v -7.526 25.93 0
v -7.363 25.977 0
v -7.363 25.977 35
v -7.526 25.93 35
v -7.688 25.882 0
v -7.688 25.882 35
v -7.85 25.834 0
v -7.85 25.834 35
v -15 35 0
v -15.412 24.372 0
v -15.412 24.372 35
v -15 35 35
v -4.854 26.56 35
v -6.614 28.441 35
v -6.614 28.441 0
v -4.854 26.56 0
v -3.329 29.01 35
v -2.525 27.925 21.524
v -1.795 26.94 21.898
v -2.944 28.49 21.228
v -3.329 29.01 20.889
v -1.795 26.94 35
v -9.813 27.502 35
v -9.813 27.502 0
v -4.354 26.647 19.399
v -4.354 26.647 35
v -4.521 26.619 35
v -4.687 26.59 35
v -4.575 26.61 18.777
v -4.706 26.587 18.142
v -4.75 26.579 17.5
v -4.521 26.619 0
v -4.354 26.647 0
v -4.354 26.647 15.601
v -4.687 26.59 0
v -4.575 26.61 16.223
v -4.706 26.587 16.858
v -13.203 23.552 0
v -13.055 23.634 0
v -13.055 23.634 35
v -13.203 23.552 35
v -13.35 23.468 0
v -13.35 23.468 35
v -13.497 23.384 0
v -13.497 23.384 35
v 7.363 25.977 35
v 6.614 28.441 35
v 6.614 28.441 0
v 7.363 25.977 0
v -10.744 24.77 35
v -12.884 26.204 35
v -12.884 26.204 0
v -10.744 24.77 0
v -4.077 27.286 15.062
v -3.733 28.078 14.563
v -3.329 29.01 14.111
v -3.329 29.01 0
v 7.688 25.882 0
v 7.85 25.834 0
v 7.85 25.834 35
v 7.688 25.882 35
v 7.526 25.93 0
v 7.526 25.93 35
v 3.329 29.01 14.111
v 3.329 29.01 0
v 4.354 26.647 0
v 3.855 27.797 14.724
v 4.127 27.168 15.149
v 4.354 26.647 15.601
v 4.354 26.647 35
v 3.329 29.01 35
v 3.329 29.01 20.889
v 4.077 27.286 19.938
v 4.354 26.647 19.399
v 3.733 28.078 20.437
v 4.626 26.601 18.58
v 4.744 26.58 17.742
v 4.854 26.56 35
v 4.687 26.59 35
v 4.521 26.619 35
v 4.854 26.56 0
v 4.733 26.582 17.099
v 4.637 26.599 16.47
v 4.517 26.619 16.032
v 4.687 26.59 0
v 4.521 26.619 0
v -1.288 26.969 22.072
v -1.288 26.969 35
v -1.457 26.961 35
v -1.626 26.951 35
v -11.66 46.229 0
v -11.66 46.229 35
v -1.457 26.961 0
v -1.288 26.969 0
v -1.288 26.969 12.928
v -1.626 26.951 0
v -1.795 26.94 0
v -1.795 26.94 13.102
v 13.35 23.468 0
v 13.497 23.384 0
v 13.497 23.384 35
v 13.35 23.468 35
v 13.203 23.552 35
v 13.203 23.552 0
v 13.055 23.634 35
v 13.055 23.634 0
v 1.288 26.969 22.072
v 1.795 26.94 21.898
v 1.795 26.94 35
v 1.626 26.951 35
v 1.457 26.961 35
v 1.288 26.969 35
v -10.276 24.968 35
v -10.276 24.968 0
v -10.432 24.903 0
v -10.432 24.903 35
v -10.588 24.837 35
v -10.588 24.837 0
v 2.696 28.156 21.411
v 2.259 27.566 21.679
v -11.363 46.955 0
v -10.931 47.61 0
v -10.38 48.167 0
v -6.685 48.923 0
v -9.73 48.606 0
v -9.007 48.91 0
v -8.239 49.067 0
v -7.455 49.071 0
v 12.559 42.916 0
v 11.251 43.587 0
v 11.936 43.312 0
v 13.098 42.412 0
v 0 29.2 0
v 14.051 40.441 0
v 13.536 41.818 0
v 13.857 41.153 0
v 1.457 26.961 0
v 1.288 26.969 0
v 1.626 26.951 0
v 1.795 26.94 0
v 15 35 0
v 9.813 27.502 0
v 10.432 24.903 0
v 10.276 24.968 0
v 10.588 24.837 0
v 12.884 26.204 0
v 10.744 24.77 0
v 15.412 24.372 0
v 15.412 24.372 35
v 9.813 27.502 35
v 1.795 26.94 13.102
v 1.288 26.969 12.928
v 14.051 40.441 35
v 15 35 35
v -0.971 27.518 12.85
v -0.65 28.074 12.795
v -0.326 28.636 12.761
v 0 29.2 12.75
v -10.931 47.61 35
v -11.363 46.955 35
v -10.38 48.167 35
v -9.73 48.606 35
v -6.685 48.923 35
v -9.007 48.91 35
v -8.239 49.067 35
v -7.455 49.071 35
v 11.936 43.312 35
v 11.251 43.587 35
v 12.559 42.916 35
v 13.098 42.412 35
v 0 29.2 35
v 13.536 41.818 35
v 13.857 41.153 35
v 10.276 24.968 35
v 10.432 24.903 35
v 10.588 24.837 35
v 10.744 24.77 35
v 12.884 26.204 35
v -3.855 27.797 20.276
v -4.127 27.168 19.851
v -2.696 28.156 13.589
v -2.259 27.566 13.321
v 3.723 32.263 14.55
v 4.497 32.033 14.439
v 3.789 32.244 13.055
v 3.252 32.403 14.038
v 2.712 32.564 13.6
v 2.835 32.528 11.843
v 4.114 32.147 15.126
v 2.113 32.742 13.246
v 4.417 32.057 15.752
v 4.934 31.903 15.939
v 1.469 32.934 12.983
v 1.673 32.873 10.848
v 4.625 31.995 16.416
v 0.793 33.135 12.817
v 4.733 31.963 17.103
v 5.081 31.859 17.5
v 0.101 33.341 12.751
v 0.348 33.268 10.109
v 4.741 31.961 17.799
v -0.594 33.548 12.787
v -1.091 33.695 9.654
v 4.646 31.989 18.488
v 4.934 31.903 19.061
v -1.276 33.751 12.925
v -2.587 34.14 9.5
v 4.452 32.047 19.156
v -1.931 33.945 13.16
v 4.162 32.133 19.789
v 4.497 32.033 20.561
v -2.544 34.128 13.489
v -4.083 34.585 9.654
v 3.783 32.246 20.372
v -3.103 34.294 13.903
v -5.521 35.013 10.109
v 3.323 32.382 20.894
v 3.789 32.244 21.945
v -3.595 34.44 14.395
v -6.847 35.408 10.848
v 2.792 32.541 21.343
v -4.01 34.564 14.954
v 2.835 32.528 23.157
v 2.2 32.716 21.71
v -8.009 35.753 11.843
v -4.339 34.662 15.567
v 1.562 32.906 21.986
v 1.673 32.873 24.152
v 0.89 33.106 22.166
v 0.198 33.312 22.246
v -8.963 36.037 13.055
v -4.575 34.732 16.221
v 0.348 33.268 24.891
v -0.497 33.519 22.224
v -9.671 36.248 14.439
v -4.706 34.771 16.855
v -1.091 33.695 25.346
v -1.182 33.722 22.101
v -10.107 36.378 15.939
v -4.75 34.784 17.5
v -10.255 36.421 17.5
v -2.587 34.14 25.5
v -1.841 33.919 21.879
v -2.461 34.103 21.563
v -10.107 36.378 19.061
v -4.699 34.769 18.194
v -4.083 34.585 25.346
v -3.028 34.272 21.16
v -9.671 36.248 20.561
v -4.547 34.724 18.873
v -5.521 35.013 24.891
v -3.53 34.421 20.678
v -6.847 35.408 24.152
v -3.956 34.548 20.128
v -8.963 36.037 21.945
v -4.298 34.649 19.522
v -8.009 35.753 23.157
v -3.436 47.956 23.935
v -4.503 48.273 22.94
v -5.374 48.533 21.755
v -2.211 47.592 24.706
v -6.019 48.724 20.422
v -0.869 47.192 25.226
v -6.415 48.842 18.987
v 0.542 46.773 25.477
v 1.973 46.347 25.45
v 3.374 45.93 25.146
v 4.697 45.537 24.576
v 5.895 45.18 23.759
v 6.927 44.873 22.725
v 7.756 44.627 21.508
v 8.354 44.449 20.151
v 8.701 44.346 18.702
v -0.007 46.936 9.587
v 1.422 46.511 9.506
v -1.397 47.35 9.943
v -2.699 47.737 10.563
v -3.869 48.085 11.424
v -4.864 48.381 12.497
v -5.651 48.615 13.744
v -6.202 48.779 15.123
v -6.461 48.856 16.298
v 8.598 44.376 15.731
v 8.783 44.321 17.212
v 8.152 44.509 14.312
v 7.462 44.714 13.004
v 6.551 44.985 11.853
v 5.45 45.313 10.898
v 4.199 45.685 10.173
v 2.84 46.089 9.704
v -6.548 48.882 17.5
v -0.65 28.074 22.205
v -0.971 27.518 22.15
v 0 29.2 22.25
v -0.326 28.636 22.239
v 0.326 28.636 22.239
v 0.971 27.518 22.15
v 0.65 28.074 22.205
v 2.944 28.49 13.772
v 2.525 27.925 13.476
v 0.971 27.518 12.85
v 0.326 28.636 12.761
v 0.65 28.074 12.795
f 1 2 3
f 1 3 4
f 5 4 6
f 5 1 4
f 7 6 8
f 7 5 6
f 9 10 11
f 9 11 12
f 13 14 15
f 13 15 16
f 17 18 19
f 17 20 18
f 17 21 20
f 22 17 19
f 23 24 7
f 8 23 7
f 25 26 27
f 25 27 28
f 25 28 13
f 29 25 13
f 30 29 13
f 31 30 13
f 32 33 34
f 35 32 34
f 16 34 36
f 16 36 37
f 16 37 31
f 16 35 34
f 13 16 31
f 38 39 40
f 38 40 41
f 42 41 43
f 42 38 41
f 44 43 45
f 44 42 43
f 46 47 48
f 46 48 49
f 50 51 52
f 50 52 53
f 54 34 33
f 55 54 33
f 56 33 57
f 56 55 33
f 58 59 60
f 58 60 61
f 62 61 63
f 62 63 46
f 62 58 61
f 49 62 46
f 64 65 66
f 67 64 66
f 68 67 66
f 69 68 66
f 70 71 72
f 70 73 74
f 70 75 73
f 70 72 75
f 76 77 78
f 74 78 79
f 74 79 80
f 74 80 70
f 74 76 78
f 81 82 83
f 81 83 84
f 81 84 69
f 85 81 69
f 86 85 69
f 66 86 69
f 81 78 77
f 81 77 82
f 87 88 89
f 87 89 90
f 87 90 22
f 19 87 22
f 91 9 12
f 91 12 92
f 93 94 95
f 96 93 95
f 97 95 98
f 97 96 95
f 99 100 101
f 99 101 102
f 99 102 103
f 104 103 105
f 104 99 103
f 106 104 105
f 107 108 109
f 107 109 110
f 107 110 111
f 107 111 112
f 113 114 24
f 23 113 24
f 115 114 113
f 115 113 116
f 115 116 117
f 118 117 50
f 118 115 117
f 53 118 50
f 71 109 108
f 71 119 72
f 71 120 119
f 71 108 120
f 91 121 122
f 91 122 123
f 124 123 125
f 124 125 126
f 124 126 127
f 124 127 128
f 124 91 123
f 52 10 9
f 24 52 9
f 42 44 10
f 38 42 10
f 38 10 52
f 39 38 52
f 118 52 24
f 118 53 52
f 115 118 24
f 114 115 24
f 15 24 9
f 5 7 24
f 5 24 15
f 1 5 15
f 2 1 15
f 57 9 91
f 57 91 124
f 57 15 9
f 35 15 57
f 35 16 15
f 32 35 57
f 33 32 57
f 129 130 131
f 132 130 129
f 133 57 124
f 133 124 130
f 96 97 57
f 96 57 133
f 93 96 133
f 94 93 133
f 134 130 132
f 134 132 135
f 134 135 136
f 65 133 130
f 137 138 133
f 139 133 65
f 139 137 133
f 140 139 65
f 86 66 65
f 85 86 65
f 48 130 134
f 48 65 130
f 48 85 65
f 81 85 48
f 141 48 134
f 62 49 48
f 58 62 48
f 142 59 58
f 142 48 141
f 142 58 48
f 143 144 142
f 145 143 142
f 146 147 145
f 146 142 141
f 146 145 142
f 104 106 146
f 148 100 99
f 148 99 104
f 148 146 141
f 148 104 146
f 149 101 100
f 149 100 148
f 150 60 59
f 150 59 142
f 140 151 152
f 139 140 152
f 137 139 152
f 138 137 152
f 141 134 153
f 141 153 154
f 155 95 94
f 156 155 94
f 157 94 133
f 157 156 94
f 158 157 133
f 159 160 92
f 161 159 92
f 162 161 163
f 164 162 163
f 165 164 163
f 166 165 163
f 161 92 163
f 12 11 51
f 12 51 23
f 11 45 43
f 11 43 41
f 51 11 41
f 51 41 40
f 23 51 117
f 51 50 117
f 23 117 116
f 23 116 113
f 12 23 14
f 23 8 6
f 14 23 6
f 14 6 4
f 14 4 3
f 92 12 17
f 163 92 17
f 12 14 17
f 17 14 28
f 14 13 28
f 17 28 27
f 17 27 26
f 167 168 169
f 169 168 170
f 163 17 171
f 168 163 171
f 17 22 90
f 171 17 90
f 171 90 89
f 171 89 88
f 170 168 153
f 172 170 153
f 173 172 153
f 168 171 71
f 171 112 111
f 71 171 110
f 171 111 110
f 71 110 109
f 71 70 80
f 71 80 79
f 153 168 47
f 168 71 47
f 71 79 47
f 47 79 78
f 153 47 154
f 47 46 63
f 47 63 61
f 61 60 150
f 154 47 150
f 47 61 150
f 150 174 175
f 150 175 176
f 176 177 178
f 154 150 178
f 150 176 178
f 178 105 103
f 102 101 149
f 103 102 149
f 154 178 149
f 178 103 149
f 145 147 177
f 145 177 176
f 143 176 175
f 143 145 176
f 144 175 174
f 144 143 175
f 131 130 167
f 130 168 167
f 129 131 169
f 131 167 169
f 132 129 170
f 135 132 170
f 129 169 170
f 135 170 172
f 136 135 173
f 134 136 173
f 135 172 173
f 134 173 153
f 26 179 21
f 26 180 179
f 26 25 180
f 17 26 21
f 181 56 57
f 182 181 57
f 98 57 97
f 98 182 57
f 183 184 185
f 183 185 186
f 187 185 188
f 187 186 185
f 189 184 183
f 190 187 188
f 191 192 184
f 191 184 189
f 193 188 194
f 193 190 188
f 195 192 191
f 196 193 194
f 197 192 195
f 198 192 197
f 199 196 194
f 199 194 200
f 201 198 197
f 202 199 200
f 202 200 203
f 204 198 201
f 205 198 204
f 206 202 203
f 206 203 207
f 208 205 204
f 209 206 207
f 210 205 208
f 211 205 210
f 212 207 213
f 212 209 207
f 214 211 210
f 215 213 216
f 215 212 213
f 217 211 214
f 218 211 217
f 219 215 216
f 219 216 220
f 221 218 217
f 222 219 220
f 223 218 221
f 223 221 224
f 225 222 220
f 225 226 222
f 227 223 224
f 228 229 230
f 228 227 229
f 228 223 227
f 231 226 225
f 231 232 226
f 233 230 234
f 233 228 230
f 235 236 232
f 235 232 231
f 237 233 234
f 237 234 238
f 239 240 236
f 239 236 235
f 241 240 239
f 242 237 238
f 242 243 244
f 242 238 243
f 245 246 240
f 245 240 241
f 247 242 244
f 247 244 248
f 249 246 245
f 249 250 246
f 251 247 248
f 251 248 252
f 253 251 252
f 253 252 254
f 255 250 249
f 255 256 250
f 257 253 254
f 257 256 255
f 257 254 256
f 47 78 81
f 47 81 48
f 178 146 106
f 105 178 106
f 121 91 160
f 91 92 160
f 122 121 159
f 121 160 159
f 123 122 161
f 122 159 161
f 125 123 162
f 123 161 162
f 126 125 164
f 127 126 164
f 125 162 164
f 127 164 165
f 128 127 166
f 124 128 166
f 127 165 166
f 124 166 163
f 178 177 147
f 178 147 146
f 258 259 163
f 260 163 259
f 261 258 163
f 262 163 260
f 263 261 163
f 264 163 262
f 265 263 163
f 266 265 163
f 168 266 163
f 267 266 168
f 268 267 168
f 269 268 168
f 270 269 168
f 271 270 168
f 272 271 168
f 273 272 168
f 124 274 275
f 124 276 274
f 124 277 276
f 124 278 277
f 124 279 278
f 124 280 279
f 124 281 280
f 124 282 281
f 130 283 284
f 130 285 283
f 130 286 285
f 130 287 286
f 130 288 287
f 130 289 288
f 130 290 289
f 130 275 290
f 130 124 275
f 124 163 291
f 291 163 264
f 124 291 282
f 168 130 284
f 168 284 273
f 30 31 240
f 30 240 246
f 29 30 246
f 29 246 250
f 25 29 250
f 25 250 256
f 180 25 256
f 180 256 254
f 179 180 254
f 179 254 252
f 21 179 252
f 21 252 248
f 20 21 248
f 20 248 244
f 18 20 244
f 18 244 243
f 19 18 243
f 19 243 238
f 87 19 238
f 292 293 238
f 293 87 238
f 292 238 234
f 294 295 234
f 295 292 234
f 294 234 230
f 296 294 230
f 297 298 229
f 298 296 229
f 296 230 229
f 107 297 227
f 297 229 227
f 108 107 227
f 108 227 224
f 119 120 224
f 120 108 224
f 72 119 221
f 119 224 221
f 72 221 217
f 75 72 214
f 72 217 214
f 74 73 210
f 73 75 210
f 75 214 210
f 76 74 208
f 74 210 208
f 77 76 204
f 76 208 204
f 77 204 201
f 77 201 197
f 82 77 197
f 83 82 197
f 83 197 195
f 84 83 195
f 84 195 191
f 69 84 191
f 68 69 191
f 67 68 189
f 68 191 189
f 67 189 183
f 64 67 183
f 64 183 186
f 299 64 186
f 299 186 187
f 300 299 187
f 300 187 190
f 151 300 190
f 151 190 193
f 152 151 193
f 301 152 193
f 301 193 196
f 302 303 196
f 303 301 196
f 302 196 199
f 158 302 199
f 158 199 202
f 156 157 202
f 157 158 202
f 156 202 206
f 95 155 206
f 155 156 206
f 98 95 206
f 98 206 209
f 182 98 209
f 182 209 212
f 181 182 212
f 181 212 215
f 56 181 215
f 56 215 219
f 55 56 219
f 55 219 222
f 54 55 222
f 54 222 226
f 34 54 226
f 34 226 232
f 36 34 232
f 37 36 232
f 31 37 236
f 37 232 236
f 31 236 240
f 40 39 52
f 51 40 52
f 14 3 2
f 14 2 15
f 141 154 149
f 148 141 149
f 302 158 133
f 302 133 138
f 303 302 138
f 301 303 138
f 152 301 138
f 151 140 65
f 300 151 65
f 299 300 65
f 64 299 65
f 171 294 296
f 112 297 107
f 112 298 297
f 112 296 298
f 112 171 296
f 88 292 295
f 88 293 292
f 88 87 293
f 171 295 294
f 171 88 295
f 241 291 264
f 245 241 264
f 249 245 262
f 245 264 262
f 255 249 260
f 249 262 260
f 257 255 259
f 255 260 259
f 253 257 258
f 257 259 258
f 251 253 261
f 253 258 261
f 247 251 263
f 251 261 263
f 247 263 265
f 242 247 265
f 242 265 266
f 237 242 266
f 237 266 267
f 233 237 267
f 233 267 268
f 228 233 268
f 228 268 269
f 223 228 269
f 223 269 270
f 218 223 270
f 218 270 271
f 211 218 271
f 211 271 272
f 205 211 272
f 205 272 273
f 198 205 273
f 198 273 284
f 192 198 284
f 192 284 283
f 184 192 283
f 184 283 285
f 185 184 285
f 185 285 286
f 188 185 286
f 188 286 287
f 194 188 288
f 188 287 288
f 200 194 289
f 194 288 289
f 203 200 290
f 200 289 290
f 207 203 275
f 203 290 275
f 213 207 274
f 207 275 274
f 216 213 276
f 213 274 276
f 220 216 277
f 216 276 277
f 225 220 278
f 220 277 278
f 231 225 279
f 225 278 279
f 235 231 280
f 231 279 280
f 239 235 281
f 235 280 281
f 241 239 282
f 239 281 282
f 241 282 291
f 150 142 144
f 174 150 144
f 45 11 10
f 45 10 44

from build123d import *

# Parameters (mm, degrees)
PAD_DEPTH          = 35
SKETCH003_R        = 4.75
POCKET_DEPTH       = 12.893309
PAD001_DEPTH       = 35
SKETCH005_R        = 8
POCKET001_DEPTH    = 13
POCKET002_DEPTH    = 143.950619
POLARPATTERN_COUNT = 55
FILLET_R           = 4


with BuildPart() as part:
    # Sketch → Pad (new body)
    with BuildSketch(Plane.XY):
        with BuildLine():
            ThreePointArc((15.5, 22.107691), (0, 27), (-15.5, 22.107691))
            Line((-15.5, 22.107691), (-15, 35))
            Line((-15, 35), (15, 35))
            Line((15, 35), (15.5, 22.107691))
        make_face()
    extrude(amount=PAD_DEPTH)

    # Sketch003 (on Face3 of Pad) → Pocket (cut, through all)
    with BuildSketch(Plane(origin=(0, 35, 0), x_dir=(-1, 0, 0), z_dir=(0, 1, 0))):
        with Locations((0, 17.5)):
            Circle(SKETCH003_R)
    extrude(amount=-POCKET_DEPTH, mode=Mode.SUBTRACT)

    # Sketch004 (on Face3 of Pocket) → Pad001 (join)
    with BuildSketch(Plane(origin=(0, 0, 0), x_dir=(1, 0, 0), z_dir=(0, 0, -1))):
        Polygon((-15, -35), (-10.519122, -50.063099), (13.624797, -42.880915), (15, -35), align=None)
    extrude(amount=-PAD001_DEPTH)

    # Sketch005 (on Face12 of Pad001) → Pocket001 (cut)
    with BuildSketch(Plane(origin=(12.826585, 43.118362, 0), x_dir=(-0.95849, 0.285126, 0), z_dir=(0.285126, 0.95849, 0))):
        with Locations((12.213826, 17.5)):
            Circle(SKETCH005_R)
    extrude(amount=-POCKET001_DEPTH, mode=Mode.SUBTRACT)

    # Sketch001 (on Face4 of Pocket001) → Pocket002 (cut, through all)
    with BuildSketch(Plane.XY.offset(35)):
        Polygon((-7.025, 17.032343), (0, 29.2), (7.025, 17.032343), align=None)
    pocket002 = extrude(amount=-POCKET002_DEPTH, mode=Mode.SUBTRACT)

    # PolarPattern: Pocket002 ×55 about axis
    polarpattern_axis = Axis((0, 0, 35), (0, 0, 1))
    for i in range(1, POLARPATTERN_COUNT):
        add(pocket002.rotate(polarpattern_axis, i * 360 / POLARPATTERN_COUNT), mode=Mode.SUBTRACT)

    # Fillet
    fillet_edges = [part.edges().sort_by_distance(p)[0] for p in [
        (13.624797, 42.880915, 17.5),
        (-10.519122, 50.063099, 17.5),
    ]]
    fillet(fillet_edges, radius=FILLET_R)


solid = part.part
